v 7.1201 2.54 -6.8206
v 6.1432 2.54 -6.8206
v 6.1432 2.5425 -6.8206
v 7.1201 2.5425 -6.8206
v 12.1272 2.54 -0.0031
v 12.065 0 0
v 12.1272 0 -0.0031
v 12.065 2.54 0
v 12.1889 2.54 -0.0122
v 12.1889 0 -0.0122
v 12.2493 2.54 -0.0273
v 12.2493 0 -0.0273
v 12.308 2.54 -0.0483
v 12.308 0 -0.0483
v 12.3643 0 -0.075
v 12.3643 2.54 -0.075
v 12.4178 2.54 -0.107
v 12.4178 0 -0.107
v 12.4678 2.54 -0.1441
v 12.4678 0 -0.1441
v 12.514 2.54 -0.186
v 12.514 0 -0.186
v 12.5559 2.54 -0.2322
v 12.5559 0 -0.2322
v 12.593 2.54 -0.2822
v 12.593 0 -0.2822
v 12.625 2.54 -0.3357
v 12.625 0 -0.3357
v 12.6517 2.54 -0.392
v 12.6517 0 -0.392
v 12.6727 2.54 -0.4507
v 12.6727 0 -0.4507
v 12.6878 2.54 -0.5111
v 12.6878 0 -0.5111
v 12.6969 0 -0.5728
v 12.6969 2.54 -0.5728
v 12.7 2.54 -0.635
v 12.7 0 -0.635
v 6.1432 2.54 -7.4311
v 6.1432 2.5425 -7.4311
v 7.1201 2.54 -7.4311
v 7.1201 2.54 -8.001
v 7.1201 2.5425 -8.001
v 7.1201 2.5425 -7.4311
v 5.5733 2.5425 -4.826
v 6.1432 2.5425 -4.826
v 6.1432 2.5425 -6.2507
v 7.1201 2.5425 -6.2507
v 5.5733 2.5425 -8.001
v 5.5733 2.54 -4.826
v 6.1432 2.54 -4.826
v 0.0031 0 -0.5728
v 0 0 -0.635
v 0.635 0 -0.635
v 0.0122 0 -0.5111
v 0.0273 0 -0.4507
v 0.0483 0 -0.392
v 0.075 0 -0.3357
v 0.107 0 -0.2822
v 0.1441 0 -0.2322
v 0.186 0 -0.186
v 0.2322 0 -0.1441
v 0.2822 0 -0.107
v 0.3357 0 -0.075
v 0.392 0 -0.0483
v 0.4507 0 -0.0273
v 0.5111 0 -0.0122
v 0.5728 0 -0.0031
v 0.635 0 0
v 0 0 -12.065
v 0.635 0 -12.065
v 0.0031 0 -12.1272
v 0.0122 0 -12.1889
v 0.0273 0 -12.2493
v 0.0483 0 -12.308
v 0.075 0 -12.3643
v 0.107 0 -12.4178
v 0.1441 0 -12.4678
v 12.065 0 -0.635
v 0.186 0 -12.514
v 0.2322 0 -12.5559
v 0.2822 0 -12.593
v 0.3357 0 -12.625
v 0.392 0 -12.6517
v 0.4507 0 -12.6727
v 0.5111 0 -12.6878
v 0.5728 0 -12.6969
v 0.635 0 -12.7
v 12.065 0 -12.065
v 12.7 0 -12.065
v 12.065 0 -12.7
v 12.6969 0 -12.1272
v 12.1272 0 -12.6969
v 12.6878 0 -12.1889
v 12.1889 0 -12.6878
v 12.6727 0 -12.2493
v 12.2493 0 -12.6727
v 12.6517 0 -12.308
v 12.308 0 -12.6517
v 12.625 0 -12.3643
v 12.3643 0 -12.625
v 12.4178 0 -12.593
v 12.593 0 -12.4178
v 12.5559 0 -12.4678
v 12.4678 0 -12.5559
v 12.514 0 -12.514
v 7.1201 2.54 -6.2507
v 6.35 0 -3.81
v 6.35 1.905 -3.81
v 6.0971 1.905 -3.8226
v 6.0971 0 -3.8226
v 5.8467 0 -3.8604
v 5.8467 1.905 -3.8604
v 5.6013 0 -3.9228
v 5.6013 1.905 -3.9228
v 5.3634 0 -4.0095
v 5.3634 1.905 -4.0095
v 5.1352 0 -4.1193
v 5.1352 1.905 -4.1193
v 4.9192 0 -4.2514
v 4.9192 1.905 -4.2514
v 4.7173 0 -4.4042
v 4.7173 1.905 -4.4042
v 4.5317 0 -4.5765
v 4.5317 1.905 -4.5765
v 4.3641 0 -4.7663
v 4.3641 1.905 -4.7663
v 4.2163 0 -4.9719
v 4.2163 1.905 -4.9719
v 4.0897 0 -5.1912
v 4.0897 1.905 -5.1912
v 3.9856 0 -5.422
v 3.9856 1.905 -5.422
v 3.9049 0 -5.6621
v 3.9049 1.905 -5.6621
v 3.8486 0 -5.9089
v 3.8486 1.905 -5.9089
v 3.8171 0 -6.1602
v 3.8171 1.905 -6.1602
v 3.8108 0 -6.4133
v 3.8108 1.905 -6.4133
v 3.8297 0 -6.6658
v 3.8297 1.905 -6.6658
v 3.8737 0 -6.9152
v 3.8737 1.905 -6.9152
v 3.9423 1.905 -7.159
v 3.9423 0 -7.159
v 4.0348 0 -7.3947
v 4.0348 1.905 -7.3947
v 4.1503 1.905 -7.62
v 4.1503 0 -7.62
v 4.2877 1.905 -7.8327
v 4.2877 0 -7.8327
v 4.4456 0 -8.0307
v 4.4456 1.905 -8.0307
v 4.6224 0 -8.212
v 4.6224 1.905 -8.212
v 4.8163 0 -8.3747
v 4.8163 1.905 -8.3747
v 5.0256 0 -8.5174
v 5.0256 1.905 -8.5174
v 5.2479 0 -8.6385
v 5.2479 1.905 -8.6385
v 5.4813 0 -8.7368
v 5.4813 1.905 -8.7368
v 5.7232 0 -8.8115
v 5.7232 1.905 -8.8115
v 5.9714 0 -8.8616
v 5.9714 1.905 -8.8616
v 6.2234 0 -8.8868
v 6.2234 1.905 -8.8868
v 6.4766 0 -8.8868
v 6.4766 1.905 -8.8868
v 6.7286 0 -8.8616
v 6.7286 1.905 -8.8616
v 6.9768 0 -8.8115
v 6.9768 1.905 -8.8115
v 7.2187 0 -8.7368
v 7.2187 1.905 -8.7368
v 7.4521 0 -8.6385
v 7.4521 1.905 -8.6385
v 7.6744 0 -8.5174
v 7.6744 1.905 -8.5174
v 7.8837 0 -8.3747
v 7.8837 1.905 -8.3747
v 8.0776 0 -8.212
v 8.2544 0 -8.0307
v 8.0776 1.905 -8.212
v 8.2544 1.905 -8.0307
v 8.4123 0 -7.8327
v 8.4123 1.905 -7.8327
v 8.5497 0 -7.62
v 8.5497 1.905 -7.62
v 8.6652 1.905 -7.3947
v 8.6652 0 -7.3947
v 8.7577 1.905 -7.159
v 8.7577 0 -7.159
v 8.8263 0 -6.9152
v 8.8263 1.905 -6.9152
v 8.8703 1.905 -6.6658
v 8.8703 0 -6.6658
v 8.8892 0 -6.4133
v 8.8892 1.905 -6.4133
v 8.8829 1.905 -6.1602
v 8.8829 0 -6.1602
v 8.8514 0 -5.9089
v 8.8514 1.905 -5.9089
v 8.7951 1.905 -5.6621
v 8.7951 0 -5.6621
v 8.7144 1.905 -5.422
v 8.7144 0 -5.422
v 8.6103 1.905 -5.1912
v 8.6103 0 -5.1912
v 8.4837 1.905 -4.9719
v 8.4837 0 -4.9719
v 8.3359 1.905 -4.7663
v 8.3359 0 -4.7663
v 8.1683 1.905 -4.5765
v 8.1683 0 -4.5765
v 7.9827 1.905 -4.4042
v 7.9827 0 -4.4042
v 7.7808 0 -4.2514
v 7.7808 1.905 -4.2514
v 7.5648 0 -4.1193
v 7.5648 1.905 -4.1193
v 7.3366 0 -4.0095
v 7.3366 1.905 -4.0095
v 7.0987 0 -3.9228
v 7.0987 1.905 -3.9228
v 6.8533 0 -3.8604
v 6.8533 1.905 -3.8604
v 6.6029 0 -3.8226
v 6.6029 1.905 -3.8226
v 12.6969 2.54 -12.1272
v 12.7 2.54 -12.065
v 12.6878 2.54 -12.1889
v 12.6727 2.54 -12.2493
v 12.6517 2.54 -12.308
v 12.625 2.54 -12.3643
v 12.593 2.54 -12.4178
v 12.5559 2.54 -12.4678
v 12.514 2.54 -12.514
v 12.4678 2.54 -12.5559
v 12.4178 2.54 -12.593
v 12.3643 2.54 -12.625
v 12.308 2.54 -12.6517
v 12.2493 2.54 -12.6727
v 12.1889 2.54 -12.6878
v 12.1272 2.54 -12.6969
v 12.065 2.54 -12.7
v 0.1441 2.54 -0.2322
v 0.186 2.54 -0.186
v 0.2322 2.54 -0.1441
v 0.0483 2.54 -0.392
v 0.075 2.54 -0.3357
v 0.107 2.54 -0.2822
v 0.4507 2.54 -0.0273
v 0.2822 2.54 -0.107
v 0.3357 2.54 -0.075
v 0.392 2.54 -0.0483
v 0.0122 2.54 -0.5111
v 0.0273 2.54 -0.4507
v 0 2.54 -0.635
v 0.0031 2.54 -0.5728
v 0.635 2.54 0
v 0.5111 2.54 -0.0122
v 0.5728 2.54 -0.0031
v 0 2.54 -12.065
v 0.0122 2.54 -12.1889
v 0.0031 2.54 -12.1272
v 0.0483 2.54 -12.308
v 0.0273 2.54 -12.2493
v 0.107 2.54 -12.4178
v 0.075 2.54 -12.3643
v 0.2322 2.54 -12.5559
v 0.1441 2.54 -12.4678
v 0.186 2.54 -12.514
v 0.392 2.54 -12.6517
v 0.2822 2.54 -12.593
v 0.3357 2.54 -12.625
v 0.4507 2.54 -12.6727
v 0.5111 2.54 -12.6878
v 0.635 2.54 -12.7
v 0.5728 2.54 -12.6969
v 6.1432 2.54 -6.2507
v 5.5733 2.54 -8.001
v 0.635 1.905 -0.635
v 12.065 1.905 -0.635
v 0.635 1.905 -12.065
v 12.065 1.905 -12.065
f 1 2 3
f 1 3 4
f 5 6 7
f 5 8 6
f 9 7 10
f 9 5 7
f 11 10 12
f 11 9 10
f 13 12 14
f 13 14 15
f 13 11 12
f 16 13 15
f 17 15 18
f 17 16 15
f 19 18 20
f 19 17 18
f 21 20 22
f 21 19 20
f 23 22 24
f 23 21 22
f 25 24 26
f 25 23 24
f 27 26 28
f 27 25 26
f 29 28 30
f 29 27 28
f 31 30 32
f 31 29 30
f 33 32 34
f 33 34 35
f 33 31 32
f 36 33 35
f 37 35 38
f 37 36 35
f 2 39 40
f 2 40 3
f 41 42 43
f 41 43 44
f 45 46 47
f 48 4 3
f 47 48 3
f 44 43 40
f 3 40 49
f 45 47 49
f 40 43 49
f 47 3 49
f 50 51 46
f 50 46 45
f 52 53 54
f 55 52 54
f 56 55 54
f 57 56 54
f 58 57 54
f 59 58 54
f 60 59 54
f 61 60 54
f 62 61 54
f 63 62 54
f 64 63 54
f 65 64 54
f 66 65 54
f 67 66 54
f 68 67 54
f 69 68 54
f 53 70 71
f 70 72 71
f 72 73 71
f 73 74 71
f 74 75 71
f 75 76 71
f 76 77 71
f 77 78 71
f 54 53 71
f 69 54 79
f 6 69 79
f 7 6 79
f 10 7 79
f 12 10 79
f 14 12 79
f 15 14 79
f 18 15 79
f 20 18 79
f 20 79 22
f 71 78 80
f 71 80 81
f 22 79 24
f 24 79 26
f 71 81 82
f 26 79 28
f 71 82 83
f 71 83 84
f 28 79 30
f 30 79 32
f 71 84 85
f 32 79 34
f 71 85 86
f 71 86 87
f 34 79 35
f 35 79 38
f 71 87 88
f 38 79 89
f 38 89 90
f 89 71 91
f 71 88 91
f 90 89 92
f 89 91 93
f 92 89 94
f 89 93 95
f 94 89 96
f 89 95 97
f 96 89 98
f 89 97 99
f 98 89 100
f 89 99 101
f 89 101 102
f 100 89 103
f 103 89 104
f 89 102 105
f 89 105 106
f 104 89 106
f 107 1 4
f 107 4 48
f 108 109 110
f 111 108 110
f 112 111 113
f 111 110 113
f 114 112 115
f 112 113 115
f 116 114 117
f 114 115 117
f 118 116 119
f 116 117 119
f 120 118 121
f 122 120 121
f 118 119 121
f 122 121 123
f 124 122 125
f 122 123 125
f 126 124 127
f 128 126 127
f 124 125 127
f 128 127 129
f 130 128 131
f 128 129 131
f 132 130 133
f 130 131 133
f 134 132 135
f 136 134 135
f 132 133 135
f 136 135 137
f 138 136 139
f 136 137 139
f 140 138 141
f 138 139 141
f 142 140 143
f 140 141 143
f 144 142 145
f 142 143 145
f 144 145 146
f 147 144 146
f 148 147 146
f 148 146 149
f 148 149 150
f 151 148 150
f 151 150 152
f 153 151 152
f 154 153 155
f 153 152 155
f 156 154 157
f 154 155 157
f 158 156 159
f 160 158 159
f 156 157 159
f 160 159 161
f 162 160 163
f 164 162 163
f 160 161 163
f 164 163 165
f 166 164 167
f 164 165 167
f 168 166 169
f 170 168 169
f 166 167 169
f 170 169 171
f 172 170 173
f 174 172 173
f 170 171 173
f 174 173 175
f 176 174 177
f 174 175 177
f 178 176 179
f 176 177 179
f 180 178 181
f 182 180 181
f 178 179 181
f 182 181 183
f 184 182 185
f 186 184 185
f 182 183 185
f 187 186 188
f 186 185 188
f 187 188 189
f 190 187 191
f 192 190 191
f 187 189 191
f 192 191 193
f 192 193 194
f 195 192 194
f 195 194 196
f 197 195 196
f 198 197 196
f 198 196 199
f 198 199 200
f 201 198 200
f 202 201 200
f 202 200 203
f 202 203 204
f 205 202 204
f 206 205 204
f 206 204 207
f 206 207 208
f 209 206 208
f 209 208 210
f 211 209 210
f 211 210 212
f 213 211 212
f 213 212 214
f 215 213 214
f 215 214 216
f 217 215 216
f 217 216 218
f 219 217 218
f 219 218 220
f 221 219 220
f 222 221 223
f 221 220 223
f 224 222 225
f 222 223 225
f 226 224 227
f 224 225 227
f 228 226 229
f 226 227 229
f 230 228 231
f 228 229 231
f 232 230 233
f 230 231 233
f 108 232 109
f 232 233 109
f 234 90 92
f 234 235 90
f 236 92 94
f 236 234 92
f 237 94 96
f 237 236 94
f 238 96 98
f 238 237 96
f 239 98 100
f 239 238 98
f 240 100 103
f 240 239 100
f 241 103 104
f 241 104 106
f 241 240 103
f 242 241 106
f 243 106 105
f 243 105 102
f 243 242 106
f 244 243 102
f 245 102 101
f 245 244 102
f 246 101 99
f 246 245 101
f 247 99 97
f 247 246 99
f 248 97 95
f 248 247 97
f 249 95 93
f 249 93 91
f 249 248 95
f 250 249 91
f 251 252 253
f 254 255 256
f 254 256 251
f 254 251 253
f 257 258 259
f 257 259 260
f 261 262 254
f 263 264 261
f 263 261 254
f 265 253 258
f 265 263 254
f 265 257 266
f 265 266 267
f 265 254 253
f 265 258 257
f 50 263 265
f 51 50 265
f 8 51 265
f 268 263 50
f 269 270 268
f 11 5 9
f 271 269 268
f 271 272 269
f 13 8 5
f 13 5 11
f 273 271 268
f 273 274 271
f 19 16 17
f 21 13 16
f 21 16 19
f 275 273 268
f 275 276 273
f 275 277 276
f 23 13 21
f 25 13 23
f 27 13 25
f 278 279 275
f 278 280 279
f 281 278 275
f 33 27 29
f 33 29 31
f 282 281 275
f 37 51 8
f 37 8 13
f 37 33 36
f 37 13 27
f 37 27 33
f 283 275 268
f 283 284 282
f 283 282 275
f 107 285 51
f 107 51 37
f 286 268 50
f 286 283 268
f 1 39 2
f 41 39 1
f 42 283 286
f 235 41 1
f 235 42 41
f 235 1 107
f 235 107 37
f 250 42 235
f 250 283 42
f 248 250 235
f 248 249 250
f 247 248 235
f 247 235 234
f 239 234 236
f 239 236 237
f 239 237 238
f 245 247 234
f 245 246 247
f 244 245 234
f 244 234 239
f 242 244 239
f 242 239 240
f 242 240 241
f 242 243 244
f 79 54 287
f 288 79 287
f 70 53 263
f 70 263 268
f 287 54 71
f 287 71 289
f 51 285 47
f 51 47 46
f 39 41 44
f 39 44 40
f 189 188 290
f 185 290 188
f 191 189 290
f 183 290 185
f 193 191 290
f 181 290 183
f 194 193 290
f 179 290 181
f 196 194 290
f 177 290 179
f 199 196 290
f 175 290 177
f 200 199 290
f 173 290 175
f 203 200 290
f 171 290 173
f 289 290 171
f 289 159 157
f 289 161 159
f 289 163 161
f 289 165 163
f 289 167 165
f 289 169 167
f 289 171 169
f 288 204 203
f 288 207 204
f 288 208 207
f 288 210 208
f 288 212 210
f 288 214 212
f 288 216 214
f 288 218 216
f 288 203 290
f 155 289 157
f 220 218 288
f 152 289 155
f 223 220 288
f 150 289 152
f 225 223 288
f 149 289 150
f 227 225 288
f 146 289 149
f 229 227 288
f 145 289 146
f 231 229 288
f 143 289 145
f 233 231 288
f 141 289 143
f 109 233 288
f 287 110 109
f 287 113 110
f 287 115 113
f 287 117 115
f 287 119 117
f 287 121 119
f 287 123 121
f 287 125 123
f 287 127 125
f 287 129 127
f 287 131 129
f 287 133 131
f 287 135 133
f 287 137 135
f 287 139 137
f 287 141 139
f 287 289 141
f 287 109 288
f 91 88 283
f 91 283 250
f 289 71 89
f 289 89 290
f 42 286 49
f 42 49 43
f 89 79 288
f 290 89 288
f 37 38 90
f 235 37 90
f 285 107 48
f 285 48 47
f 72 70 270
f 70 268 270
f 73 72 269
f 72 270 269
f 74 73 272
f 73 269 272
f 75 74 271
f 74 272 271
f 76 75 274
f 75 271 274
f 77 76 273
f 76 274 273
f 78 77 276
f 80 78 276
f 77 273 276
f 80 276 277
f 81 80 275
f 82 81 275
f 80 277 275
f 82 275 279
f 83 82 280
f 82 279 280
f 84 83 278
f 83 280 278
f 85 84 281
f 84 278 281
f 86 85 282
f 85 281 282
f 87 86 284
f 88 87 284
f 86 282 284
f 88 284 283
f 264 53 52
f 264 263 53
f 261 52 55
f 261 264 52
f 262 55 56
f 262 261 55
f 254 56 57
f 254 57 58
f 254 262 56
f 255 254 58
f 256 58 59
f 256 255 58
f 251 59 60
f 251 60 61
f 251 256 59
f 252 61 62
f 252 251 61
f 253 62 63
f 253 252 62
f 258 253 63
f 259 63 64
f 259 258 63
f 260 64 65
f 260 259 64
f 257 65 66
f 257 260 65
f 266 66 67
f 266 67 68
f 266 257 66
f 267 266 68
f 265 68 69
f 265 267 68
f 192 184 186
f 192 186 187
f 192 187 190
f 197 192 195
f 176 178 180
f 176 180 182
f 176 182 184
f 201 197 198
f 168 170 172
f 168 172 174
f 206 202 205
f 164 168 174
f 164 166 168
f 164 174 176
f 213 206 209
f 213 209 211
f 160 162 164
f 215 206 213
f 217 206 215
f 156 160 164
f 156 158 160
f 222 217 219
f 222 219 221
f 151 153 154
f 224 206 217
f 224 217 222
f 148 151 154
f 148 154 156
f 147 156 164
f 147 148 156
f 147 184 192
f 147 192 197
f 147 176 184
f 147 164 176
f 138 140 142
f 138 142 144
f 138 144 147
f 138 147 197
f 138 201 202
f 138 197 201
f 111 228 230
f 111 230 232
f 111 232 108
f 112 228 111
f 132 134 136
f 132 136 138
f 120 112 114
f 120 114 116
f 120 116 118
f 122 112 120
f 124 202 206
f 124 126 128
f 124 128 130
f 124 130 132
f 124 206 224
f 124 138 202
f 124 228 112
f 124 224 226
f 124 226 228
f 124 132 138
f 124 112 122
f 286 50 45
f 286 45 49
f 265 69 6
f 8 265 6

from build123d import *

# Parameters (mm, degrees)
SKETCH1_W           = 12.7
SKETCH1_H           = 12.7
BOSS_EXTRUDE1_DEPTH = 2.54
FILLET1_R           = 0.635
SHELL1_START        = 0.635
SHELL1_OUTLINE_W    = 1.905
SHELL1_OUTLINE_H    = 11.43
SHELL1_DEPTH        = 11.43
SKETCH2_R           = 2.54
BOSS_EXTRUDE2_DEPTH = 1.905
BOSS_EXTRUDE3_DEPTH = 0.00254


# Read off the part's stored shape, not the designer's step: Shell1
with BuildPart() as part:
    # Sketch1 → Boss-Extrude1 (new body)
    with BuildSketch(Plane(origin=(0, 0, 0), x_dir=(1, 0, 0), z_dir=(0, 1, 0))):
        with Locations((6.35, 6.35)):
            Rectangle(SKETCH1_W, SKETCH1_H)
    extrude(amount=BOSS_EXTRUDE1_DEPTH)

    # Fillet1
    fillet1_edges = [part.edges().sort_by_distance(p)[0] for p in [
        (0, 1.27, -12.7),
        (12.7, 1.27, -12.7),
        (12.7, 1.27, 0),
        (0, 1.27, 0),
    ]]
    fillet(fillet1_edges, radius=FILLET1_R)

    # Shell1 outline → Shell1 (cut)
    with BuildSketch(Plane.YZ.offset(SHELL1_START)):
        with Locations((0.9525, -6.35)):
            Rectangle(SHELL1_OUTLINE_W, SHELL1_OUTLINE_H)
    extrude(amount=SHELL1_DEPTH, mode=Mode.SUBTRACT)

    # Sketch2 → Boss-Extrude2 (add)
    with BuildSketch(Plane(origin=(0, 1.905, 0), x_dir=(-1, 0, 0), z_dir=(0, -1, 0))):
        with Locations(Location((-6.35, 6.35, 0), (0, 0, 270))):
            Circle(SKETCH2_R)
    extrude(amount=BOSS_EXTRUDE2_DEPTH)

    # Sketch3 → Boss-Extrude3 (add)
    with BuildSketch(Plane(origin=(0, 2.54, 0), x_dir=(1, 0, 0), z_dir=(0, 1, 0))):
        Polygon((5.573346154, 8.001), (7.120141026, 8.001), (7.120141026, 7.431128205), (6.143217949, 7.431128205), (6.143217949, 6.820551282), (7.120141026, 6.820551282), (7.120141026, 6.250679487), (6.143217949, 6.250679487), (6.143217949, 4.826), (5.573346154, 4.826), align=None)
    extrude(amount=BOSS_EXTRUDE3_DEPTH)


solid = part.part
